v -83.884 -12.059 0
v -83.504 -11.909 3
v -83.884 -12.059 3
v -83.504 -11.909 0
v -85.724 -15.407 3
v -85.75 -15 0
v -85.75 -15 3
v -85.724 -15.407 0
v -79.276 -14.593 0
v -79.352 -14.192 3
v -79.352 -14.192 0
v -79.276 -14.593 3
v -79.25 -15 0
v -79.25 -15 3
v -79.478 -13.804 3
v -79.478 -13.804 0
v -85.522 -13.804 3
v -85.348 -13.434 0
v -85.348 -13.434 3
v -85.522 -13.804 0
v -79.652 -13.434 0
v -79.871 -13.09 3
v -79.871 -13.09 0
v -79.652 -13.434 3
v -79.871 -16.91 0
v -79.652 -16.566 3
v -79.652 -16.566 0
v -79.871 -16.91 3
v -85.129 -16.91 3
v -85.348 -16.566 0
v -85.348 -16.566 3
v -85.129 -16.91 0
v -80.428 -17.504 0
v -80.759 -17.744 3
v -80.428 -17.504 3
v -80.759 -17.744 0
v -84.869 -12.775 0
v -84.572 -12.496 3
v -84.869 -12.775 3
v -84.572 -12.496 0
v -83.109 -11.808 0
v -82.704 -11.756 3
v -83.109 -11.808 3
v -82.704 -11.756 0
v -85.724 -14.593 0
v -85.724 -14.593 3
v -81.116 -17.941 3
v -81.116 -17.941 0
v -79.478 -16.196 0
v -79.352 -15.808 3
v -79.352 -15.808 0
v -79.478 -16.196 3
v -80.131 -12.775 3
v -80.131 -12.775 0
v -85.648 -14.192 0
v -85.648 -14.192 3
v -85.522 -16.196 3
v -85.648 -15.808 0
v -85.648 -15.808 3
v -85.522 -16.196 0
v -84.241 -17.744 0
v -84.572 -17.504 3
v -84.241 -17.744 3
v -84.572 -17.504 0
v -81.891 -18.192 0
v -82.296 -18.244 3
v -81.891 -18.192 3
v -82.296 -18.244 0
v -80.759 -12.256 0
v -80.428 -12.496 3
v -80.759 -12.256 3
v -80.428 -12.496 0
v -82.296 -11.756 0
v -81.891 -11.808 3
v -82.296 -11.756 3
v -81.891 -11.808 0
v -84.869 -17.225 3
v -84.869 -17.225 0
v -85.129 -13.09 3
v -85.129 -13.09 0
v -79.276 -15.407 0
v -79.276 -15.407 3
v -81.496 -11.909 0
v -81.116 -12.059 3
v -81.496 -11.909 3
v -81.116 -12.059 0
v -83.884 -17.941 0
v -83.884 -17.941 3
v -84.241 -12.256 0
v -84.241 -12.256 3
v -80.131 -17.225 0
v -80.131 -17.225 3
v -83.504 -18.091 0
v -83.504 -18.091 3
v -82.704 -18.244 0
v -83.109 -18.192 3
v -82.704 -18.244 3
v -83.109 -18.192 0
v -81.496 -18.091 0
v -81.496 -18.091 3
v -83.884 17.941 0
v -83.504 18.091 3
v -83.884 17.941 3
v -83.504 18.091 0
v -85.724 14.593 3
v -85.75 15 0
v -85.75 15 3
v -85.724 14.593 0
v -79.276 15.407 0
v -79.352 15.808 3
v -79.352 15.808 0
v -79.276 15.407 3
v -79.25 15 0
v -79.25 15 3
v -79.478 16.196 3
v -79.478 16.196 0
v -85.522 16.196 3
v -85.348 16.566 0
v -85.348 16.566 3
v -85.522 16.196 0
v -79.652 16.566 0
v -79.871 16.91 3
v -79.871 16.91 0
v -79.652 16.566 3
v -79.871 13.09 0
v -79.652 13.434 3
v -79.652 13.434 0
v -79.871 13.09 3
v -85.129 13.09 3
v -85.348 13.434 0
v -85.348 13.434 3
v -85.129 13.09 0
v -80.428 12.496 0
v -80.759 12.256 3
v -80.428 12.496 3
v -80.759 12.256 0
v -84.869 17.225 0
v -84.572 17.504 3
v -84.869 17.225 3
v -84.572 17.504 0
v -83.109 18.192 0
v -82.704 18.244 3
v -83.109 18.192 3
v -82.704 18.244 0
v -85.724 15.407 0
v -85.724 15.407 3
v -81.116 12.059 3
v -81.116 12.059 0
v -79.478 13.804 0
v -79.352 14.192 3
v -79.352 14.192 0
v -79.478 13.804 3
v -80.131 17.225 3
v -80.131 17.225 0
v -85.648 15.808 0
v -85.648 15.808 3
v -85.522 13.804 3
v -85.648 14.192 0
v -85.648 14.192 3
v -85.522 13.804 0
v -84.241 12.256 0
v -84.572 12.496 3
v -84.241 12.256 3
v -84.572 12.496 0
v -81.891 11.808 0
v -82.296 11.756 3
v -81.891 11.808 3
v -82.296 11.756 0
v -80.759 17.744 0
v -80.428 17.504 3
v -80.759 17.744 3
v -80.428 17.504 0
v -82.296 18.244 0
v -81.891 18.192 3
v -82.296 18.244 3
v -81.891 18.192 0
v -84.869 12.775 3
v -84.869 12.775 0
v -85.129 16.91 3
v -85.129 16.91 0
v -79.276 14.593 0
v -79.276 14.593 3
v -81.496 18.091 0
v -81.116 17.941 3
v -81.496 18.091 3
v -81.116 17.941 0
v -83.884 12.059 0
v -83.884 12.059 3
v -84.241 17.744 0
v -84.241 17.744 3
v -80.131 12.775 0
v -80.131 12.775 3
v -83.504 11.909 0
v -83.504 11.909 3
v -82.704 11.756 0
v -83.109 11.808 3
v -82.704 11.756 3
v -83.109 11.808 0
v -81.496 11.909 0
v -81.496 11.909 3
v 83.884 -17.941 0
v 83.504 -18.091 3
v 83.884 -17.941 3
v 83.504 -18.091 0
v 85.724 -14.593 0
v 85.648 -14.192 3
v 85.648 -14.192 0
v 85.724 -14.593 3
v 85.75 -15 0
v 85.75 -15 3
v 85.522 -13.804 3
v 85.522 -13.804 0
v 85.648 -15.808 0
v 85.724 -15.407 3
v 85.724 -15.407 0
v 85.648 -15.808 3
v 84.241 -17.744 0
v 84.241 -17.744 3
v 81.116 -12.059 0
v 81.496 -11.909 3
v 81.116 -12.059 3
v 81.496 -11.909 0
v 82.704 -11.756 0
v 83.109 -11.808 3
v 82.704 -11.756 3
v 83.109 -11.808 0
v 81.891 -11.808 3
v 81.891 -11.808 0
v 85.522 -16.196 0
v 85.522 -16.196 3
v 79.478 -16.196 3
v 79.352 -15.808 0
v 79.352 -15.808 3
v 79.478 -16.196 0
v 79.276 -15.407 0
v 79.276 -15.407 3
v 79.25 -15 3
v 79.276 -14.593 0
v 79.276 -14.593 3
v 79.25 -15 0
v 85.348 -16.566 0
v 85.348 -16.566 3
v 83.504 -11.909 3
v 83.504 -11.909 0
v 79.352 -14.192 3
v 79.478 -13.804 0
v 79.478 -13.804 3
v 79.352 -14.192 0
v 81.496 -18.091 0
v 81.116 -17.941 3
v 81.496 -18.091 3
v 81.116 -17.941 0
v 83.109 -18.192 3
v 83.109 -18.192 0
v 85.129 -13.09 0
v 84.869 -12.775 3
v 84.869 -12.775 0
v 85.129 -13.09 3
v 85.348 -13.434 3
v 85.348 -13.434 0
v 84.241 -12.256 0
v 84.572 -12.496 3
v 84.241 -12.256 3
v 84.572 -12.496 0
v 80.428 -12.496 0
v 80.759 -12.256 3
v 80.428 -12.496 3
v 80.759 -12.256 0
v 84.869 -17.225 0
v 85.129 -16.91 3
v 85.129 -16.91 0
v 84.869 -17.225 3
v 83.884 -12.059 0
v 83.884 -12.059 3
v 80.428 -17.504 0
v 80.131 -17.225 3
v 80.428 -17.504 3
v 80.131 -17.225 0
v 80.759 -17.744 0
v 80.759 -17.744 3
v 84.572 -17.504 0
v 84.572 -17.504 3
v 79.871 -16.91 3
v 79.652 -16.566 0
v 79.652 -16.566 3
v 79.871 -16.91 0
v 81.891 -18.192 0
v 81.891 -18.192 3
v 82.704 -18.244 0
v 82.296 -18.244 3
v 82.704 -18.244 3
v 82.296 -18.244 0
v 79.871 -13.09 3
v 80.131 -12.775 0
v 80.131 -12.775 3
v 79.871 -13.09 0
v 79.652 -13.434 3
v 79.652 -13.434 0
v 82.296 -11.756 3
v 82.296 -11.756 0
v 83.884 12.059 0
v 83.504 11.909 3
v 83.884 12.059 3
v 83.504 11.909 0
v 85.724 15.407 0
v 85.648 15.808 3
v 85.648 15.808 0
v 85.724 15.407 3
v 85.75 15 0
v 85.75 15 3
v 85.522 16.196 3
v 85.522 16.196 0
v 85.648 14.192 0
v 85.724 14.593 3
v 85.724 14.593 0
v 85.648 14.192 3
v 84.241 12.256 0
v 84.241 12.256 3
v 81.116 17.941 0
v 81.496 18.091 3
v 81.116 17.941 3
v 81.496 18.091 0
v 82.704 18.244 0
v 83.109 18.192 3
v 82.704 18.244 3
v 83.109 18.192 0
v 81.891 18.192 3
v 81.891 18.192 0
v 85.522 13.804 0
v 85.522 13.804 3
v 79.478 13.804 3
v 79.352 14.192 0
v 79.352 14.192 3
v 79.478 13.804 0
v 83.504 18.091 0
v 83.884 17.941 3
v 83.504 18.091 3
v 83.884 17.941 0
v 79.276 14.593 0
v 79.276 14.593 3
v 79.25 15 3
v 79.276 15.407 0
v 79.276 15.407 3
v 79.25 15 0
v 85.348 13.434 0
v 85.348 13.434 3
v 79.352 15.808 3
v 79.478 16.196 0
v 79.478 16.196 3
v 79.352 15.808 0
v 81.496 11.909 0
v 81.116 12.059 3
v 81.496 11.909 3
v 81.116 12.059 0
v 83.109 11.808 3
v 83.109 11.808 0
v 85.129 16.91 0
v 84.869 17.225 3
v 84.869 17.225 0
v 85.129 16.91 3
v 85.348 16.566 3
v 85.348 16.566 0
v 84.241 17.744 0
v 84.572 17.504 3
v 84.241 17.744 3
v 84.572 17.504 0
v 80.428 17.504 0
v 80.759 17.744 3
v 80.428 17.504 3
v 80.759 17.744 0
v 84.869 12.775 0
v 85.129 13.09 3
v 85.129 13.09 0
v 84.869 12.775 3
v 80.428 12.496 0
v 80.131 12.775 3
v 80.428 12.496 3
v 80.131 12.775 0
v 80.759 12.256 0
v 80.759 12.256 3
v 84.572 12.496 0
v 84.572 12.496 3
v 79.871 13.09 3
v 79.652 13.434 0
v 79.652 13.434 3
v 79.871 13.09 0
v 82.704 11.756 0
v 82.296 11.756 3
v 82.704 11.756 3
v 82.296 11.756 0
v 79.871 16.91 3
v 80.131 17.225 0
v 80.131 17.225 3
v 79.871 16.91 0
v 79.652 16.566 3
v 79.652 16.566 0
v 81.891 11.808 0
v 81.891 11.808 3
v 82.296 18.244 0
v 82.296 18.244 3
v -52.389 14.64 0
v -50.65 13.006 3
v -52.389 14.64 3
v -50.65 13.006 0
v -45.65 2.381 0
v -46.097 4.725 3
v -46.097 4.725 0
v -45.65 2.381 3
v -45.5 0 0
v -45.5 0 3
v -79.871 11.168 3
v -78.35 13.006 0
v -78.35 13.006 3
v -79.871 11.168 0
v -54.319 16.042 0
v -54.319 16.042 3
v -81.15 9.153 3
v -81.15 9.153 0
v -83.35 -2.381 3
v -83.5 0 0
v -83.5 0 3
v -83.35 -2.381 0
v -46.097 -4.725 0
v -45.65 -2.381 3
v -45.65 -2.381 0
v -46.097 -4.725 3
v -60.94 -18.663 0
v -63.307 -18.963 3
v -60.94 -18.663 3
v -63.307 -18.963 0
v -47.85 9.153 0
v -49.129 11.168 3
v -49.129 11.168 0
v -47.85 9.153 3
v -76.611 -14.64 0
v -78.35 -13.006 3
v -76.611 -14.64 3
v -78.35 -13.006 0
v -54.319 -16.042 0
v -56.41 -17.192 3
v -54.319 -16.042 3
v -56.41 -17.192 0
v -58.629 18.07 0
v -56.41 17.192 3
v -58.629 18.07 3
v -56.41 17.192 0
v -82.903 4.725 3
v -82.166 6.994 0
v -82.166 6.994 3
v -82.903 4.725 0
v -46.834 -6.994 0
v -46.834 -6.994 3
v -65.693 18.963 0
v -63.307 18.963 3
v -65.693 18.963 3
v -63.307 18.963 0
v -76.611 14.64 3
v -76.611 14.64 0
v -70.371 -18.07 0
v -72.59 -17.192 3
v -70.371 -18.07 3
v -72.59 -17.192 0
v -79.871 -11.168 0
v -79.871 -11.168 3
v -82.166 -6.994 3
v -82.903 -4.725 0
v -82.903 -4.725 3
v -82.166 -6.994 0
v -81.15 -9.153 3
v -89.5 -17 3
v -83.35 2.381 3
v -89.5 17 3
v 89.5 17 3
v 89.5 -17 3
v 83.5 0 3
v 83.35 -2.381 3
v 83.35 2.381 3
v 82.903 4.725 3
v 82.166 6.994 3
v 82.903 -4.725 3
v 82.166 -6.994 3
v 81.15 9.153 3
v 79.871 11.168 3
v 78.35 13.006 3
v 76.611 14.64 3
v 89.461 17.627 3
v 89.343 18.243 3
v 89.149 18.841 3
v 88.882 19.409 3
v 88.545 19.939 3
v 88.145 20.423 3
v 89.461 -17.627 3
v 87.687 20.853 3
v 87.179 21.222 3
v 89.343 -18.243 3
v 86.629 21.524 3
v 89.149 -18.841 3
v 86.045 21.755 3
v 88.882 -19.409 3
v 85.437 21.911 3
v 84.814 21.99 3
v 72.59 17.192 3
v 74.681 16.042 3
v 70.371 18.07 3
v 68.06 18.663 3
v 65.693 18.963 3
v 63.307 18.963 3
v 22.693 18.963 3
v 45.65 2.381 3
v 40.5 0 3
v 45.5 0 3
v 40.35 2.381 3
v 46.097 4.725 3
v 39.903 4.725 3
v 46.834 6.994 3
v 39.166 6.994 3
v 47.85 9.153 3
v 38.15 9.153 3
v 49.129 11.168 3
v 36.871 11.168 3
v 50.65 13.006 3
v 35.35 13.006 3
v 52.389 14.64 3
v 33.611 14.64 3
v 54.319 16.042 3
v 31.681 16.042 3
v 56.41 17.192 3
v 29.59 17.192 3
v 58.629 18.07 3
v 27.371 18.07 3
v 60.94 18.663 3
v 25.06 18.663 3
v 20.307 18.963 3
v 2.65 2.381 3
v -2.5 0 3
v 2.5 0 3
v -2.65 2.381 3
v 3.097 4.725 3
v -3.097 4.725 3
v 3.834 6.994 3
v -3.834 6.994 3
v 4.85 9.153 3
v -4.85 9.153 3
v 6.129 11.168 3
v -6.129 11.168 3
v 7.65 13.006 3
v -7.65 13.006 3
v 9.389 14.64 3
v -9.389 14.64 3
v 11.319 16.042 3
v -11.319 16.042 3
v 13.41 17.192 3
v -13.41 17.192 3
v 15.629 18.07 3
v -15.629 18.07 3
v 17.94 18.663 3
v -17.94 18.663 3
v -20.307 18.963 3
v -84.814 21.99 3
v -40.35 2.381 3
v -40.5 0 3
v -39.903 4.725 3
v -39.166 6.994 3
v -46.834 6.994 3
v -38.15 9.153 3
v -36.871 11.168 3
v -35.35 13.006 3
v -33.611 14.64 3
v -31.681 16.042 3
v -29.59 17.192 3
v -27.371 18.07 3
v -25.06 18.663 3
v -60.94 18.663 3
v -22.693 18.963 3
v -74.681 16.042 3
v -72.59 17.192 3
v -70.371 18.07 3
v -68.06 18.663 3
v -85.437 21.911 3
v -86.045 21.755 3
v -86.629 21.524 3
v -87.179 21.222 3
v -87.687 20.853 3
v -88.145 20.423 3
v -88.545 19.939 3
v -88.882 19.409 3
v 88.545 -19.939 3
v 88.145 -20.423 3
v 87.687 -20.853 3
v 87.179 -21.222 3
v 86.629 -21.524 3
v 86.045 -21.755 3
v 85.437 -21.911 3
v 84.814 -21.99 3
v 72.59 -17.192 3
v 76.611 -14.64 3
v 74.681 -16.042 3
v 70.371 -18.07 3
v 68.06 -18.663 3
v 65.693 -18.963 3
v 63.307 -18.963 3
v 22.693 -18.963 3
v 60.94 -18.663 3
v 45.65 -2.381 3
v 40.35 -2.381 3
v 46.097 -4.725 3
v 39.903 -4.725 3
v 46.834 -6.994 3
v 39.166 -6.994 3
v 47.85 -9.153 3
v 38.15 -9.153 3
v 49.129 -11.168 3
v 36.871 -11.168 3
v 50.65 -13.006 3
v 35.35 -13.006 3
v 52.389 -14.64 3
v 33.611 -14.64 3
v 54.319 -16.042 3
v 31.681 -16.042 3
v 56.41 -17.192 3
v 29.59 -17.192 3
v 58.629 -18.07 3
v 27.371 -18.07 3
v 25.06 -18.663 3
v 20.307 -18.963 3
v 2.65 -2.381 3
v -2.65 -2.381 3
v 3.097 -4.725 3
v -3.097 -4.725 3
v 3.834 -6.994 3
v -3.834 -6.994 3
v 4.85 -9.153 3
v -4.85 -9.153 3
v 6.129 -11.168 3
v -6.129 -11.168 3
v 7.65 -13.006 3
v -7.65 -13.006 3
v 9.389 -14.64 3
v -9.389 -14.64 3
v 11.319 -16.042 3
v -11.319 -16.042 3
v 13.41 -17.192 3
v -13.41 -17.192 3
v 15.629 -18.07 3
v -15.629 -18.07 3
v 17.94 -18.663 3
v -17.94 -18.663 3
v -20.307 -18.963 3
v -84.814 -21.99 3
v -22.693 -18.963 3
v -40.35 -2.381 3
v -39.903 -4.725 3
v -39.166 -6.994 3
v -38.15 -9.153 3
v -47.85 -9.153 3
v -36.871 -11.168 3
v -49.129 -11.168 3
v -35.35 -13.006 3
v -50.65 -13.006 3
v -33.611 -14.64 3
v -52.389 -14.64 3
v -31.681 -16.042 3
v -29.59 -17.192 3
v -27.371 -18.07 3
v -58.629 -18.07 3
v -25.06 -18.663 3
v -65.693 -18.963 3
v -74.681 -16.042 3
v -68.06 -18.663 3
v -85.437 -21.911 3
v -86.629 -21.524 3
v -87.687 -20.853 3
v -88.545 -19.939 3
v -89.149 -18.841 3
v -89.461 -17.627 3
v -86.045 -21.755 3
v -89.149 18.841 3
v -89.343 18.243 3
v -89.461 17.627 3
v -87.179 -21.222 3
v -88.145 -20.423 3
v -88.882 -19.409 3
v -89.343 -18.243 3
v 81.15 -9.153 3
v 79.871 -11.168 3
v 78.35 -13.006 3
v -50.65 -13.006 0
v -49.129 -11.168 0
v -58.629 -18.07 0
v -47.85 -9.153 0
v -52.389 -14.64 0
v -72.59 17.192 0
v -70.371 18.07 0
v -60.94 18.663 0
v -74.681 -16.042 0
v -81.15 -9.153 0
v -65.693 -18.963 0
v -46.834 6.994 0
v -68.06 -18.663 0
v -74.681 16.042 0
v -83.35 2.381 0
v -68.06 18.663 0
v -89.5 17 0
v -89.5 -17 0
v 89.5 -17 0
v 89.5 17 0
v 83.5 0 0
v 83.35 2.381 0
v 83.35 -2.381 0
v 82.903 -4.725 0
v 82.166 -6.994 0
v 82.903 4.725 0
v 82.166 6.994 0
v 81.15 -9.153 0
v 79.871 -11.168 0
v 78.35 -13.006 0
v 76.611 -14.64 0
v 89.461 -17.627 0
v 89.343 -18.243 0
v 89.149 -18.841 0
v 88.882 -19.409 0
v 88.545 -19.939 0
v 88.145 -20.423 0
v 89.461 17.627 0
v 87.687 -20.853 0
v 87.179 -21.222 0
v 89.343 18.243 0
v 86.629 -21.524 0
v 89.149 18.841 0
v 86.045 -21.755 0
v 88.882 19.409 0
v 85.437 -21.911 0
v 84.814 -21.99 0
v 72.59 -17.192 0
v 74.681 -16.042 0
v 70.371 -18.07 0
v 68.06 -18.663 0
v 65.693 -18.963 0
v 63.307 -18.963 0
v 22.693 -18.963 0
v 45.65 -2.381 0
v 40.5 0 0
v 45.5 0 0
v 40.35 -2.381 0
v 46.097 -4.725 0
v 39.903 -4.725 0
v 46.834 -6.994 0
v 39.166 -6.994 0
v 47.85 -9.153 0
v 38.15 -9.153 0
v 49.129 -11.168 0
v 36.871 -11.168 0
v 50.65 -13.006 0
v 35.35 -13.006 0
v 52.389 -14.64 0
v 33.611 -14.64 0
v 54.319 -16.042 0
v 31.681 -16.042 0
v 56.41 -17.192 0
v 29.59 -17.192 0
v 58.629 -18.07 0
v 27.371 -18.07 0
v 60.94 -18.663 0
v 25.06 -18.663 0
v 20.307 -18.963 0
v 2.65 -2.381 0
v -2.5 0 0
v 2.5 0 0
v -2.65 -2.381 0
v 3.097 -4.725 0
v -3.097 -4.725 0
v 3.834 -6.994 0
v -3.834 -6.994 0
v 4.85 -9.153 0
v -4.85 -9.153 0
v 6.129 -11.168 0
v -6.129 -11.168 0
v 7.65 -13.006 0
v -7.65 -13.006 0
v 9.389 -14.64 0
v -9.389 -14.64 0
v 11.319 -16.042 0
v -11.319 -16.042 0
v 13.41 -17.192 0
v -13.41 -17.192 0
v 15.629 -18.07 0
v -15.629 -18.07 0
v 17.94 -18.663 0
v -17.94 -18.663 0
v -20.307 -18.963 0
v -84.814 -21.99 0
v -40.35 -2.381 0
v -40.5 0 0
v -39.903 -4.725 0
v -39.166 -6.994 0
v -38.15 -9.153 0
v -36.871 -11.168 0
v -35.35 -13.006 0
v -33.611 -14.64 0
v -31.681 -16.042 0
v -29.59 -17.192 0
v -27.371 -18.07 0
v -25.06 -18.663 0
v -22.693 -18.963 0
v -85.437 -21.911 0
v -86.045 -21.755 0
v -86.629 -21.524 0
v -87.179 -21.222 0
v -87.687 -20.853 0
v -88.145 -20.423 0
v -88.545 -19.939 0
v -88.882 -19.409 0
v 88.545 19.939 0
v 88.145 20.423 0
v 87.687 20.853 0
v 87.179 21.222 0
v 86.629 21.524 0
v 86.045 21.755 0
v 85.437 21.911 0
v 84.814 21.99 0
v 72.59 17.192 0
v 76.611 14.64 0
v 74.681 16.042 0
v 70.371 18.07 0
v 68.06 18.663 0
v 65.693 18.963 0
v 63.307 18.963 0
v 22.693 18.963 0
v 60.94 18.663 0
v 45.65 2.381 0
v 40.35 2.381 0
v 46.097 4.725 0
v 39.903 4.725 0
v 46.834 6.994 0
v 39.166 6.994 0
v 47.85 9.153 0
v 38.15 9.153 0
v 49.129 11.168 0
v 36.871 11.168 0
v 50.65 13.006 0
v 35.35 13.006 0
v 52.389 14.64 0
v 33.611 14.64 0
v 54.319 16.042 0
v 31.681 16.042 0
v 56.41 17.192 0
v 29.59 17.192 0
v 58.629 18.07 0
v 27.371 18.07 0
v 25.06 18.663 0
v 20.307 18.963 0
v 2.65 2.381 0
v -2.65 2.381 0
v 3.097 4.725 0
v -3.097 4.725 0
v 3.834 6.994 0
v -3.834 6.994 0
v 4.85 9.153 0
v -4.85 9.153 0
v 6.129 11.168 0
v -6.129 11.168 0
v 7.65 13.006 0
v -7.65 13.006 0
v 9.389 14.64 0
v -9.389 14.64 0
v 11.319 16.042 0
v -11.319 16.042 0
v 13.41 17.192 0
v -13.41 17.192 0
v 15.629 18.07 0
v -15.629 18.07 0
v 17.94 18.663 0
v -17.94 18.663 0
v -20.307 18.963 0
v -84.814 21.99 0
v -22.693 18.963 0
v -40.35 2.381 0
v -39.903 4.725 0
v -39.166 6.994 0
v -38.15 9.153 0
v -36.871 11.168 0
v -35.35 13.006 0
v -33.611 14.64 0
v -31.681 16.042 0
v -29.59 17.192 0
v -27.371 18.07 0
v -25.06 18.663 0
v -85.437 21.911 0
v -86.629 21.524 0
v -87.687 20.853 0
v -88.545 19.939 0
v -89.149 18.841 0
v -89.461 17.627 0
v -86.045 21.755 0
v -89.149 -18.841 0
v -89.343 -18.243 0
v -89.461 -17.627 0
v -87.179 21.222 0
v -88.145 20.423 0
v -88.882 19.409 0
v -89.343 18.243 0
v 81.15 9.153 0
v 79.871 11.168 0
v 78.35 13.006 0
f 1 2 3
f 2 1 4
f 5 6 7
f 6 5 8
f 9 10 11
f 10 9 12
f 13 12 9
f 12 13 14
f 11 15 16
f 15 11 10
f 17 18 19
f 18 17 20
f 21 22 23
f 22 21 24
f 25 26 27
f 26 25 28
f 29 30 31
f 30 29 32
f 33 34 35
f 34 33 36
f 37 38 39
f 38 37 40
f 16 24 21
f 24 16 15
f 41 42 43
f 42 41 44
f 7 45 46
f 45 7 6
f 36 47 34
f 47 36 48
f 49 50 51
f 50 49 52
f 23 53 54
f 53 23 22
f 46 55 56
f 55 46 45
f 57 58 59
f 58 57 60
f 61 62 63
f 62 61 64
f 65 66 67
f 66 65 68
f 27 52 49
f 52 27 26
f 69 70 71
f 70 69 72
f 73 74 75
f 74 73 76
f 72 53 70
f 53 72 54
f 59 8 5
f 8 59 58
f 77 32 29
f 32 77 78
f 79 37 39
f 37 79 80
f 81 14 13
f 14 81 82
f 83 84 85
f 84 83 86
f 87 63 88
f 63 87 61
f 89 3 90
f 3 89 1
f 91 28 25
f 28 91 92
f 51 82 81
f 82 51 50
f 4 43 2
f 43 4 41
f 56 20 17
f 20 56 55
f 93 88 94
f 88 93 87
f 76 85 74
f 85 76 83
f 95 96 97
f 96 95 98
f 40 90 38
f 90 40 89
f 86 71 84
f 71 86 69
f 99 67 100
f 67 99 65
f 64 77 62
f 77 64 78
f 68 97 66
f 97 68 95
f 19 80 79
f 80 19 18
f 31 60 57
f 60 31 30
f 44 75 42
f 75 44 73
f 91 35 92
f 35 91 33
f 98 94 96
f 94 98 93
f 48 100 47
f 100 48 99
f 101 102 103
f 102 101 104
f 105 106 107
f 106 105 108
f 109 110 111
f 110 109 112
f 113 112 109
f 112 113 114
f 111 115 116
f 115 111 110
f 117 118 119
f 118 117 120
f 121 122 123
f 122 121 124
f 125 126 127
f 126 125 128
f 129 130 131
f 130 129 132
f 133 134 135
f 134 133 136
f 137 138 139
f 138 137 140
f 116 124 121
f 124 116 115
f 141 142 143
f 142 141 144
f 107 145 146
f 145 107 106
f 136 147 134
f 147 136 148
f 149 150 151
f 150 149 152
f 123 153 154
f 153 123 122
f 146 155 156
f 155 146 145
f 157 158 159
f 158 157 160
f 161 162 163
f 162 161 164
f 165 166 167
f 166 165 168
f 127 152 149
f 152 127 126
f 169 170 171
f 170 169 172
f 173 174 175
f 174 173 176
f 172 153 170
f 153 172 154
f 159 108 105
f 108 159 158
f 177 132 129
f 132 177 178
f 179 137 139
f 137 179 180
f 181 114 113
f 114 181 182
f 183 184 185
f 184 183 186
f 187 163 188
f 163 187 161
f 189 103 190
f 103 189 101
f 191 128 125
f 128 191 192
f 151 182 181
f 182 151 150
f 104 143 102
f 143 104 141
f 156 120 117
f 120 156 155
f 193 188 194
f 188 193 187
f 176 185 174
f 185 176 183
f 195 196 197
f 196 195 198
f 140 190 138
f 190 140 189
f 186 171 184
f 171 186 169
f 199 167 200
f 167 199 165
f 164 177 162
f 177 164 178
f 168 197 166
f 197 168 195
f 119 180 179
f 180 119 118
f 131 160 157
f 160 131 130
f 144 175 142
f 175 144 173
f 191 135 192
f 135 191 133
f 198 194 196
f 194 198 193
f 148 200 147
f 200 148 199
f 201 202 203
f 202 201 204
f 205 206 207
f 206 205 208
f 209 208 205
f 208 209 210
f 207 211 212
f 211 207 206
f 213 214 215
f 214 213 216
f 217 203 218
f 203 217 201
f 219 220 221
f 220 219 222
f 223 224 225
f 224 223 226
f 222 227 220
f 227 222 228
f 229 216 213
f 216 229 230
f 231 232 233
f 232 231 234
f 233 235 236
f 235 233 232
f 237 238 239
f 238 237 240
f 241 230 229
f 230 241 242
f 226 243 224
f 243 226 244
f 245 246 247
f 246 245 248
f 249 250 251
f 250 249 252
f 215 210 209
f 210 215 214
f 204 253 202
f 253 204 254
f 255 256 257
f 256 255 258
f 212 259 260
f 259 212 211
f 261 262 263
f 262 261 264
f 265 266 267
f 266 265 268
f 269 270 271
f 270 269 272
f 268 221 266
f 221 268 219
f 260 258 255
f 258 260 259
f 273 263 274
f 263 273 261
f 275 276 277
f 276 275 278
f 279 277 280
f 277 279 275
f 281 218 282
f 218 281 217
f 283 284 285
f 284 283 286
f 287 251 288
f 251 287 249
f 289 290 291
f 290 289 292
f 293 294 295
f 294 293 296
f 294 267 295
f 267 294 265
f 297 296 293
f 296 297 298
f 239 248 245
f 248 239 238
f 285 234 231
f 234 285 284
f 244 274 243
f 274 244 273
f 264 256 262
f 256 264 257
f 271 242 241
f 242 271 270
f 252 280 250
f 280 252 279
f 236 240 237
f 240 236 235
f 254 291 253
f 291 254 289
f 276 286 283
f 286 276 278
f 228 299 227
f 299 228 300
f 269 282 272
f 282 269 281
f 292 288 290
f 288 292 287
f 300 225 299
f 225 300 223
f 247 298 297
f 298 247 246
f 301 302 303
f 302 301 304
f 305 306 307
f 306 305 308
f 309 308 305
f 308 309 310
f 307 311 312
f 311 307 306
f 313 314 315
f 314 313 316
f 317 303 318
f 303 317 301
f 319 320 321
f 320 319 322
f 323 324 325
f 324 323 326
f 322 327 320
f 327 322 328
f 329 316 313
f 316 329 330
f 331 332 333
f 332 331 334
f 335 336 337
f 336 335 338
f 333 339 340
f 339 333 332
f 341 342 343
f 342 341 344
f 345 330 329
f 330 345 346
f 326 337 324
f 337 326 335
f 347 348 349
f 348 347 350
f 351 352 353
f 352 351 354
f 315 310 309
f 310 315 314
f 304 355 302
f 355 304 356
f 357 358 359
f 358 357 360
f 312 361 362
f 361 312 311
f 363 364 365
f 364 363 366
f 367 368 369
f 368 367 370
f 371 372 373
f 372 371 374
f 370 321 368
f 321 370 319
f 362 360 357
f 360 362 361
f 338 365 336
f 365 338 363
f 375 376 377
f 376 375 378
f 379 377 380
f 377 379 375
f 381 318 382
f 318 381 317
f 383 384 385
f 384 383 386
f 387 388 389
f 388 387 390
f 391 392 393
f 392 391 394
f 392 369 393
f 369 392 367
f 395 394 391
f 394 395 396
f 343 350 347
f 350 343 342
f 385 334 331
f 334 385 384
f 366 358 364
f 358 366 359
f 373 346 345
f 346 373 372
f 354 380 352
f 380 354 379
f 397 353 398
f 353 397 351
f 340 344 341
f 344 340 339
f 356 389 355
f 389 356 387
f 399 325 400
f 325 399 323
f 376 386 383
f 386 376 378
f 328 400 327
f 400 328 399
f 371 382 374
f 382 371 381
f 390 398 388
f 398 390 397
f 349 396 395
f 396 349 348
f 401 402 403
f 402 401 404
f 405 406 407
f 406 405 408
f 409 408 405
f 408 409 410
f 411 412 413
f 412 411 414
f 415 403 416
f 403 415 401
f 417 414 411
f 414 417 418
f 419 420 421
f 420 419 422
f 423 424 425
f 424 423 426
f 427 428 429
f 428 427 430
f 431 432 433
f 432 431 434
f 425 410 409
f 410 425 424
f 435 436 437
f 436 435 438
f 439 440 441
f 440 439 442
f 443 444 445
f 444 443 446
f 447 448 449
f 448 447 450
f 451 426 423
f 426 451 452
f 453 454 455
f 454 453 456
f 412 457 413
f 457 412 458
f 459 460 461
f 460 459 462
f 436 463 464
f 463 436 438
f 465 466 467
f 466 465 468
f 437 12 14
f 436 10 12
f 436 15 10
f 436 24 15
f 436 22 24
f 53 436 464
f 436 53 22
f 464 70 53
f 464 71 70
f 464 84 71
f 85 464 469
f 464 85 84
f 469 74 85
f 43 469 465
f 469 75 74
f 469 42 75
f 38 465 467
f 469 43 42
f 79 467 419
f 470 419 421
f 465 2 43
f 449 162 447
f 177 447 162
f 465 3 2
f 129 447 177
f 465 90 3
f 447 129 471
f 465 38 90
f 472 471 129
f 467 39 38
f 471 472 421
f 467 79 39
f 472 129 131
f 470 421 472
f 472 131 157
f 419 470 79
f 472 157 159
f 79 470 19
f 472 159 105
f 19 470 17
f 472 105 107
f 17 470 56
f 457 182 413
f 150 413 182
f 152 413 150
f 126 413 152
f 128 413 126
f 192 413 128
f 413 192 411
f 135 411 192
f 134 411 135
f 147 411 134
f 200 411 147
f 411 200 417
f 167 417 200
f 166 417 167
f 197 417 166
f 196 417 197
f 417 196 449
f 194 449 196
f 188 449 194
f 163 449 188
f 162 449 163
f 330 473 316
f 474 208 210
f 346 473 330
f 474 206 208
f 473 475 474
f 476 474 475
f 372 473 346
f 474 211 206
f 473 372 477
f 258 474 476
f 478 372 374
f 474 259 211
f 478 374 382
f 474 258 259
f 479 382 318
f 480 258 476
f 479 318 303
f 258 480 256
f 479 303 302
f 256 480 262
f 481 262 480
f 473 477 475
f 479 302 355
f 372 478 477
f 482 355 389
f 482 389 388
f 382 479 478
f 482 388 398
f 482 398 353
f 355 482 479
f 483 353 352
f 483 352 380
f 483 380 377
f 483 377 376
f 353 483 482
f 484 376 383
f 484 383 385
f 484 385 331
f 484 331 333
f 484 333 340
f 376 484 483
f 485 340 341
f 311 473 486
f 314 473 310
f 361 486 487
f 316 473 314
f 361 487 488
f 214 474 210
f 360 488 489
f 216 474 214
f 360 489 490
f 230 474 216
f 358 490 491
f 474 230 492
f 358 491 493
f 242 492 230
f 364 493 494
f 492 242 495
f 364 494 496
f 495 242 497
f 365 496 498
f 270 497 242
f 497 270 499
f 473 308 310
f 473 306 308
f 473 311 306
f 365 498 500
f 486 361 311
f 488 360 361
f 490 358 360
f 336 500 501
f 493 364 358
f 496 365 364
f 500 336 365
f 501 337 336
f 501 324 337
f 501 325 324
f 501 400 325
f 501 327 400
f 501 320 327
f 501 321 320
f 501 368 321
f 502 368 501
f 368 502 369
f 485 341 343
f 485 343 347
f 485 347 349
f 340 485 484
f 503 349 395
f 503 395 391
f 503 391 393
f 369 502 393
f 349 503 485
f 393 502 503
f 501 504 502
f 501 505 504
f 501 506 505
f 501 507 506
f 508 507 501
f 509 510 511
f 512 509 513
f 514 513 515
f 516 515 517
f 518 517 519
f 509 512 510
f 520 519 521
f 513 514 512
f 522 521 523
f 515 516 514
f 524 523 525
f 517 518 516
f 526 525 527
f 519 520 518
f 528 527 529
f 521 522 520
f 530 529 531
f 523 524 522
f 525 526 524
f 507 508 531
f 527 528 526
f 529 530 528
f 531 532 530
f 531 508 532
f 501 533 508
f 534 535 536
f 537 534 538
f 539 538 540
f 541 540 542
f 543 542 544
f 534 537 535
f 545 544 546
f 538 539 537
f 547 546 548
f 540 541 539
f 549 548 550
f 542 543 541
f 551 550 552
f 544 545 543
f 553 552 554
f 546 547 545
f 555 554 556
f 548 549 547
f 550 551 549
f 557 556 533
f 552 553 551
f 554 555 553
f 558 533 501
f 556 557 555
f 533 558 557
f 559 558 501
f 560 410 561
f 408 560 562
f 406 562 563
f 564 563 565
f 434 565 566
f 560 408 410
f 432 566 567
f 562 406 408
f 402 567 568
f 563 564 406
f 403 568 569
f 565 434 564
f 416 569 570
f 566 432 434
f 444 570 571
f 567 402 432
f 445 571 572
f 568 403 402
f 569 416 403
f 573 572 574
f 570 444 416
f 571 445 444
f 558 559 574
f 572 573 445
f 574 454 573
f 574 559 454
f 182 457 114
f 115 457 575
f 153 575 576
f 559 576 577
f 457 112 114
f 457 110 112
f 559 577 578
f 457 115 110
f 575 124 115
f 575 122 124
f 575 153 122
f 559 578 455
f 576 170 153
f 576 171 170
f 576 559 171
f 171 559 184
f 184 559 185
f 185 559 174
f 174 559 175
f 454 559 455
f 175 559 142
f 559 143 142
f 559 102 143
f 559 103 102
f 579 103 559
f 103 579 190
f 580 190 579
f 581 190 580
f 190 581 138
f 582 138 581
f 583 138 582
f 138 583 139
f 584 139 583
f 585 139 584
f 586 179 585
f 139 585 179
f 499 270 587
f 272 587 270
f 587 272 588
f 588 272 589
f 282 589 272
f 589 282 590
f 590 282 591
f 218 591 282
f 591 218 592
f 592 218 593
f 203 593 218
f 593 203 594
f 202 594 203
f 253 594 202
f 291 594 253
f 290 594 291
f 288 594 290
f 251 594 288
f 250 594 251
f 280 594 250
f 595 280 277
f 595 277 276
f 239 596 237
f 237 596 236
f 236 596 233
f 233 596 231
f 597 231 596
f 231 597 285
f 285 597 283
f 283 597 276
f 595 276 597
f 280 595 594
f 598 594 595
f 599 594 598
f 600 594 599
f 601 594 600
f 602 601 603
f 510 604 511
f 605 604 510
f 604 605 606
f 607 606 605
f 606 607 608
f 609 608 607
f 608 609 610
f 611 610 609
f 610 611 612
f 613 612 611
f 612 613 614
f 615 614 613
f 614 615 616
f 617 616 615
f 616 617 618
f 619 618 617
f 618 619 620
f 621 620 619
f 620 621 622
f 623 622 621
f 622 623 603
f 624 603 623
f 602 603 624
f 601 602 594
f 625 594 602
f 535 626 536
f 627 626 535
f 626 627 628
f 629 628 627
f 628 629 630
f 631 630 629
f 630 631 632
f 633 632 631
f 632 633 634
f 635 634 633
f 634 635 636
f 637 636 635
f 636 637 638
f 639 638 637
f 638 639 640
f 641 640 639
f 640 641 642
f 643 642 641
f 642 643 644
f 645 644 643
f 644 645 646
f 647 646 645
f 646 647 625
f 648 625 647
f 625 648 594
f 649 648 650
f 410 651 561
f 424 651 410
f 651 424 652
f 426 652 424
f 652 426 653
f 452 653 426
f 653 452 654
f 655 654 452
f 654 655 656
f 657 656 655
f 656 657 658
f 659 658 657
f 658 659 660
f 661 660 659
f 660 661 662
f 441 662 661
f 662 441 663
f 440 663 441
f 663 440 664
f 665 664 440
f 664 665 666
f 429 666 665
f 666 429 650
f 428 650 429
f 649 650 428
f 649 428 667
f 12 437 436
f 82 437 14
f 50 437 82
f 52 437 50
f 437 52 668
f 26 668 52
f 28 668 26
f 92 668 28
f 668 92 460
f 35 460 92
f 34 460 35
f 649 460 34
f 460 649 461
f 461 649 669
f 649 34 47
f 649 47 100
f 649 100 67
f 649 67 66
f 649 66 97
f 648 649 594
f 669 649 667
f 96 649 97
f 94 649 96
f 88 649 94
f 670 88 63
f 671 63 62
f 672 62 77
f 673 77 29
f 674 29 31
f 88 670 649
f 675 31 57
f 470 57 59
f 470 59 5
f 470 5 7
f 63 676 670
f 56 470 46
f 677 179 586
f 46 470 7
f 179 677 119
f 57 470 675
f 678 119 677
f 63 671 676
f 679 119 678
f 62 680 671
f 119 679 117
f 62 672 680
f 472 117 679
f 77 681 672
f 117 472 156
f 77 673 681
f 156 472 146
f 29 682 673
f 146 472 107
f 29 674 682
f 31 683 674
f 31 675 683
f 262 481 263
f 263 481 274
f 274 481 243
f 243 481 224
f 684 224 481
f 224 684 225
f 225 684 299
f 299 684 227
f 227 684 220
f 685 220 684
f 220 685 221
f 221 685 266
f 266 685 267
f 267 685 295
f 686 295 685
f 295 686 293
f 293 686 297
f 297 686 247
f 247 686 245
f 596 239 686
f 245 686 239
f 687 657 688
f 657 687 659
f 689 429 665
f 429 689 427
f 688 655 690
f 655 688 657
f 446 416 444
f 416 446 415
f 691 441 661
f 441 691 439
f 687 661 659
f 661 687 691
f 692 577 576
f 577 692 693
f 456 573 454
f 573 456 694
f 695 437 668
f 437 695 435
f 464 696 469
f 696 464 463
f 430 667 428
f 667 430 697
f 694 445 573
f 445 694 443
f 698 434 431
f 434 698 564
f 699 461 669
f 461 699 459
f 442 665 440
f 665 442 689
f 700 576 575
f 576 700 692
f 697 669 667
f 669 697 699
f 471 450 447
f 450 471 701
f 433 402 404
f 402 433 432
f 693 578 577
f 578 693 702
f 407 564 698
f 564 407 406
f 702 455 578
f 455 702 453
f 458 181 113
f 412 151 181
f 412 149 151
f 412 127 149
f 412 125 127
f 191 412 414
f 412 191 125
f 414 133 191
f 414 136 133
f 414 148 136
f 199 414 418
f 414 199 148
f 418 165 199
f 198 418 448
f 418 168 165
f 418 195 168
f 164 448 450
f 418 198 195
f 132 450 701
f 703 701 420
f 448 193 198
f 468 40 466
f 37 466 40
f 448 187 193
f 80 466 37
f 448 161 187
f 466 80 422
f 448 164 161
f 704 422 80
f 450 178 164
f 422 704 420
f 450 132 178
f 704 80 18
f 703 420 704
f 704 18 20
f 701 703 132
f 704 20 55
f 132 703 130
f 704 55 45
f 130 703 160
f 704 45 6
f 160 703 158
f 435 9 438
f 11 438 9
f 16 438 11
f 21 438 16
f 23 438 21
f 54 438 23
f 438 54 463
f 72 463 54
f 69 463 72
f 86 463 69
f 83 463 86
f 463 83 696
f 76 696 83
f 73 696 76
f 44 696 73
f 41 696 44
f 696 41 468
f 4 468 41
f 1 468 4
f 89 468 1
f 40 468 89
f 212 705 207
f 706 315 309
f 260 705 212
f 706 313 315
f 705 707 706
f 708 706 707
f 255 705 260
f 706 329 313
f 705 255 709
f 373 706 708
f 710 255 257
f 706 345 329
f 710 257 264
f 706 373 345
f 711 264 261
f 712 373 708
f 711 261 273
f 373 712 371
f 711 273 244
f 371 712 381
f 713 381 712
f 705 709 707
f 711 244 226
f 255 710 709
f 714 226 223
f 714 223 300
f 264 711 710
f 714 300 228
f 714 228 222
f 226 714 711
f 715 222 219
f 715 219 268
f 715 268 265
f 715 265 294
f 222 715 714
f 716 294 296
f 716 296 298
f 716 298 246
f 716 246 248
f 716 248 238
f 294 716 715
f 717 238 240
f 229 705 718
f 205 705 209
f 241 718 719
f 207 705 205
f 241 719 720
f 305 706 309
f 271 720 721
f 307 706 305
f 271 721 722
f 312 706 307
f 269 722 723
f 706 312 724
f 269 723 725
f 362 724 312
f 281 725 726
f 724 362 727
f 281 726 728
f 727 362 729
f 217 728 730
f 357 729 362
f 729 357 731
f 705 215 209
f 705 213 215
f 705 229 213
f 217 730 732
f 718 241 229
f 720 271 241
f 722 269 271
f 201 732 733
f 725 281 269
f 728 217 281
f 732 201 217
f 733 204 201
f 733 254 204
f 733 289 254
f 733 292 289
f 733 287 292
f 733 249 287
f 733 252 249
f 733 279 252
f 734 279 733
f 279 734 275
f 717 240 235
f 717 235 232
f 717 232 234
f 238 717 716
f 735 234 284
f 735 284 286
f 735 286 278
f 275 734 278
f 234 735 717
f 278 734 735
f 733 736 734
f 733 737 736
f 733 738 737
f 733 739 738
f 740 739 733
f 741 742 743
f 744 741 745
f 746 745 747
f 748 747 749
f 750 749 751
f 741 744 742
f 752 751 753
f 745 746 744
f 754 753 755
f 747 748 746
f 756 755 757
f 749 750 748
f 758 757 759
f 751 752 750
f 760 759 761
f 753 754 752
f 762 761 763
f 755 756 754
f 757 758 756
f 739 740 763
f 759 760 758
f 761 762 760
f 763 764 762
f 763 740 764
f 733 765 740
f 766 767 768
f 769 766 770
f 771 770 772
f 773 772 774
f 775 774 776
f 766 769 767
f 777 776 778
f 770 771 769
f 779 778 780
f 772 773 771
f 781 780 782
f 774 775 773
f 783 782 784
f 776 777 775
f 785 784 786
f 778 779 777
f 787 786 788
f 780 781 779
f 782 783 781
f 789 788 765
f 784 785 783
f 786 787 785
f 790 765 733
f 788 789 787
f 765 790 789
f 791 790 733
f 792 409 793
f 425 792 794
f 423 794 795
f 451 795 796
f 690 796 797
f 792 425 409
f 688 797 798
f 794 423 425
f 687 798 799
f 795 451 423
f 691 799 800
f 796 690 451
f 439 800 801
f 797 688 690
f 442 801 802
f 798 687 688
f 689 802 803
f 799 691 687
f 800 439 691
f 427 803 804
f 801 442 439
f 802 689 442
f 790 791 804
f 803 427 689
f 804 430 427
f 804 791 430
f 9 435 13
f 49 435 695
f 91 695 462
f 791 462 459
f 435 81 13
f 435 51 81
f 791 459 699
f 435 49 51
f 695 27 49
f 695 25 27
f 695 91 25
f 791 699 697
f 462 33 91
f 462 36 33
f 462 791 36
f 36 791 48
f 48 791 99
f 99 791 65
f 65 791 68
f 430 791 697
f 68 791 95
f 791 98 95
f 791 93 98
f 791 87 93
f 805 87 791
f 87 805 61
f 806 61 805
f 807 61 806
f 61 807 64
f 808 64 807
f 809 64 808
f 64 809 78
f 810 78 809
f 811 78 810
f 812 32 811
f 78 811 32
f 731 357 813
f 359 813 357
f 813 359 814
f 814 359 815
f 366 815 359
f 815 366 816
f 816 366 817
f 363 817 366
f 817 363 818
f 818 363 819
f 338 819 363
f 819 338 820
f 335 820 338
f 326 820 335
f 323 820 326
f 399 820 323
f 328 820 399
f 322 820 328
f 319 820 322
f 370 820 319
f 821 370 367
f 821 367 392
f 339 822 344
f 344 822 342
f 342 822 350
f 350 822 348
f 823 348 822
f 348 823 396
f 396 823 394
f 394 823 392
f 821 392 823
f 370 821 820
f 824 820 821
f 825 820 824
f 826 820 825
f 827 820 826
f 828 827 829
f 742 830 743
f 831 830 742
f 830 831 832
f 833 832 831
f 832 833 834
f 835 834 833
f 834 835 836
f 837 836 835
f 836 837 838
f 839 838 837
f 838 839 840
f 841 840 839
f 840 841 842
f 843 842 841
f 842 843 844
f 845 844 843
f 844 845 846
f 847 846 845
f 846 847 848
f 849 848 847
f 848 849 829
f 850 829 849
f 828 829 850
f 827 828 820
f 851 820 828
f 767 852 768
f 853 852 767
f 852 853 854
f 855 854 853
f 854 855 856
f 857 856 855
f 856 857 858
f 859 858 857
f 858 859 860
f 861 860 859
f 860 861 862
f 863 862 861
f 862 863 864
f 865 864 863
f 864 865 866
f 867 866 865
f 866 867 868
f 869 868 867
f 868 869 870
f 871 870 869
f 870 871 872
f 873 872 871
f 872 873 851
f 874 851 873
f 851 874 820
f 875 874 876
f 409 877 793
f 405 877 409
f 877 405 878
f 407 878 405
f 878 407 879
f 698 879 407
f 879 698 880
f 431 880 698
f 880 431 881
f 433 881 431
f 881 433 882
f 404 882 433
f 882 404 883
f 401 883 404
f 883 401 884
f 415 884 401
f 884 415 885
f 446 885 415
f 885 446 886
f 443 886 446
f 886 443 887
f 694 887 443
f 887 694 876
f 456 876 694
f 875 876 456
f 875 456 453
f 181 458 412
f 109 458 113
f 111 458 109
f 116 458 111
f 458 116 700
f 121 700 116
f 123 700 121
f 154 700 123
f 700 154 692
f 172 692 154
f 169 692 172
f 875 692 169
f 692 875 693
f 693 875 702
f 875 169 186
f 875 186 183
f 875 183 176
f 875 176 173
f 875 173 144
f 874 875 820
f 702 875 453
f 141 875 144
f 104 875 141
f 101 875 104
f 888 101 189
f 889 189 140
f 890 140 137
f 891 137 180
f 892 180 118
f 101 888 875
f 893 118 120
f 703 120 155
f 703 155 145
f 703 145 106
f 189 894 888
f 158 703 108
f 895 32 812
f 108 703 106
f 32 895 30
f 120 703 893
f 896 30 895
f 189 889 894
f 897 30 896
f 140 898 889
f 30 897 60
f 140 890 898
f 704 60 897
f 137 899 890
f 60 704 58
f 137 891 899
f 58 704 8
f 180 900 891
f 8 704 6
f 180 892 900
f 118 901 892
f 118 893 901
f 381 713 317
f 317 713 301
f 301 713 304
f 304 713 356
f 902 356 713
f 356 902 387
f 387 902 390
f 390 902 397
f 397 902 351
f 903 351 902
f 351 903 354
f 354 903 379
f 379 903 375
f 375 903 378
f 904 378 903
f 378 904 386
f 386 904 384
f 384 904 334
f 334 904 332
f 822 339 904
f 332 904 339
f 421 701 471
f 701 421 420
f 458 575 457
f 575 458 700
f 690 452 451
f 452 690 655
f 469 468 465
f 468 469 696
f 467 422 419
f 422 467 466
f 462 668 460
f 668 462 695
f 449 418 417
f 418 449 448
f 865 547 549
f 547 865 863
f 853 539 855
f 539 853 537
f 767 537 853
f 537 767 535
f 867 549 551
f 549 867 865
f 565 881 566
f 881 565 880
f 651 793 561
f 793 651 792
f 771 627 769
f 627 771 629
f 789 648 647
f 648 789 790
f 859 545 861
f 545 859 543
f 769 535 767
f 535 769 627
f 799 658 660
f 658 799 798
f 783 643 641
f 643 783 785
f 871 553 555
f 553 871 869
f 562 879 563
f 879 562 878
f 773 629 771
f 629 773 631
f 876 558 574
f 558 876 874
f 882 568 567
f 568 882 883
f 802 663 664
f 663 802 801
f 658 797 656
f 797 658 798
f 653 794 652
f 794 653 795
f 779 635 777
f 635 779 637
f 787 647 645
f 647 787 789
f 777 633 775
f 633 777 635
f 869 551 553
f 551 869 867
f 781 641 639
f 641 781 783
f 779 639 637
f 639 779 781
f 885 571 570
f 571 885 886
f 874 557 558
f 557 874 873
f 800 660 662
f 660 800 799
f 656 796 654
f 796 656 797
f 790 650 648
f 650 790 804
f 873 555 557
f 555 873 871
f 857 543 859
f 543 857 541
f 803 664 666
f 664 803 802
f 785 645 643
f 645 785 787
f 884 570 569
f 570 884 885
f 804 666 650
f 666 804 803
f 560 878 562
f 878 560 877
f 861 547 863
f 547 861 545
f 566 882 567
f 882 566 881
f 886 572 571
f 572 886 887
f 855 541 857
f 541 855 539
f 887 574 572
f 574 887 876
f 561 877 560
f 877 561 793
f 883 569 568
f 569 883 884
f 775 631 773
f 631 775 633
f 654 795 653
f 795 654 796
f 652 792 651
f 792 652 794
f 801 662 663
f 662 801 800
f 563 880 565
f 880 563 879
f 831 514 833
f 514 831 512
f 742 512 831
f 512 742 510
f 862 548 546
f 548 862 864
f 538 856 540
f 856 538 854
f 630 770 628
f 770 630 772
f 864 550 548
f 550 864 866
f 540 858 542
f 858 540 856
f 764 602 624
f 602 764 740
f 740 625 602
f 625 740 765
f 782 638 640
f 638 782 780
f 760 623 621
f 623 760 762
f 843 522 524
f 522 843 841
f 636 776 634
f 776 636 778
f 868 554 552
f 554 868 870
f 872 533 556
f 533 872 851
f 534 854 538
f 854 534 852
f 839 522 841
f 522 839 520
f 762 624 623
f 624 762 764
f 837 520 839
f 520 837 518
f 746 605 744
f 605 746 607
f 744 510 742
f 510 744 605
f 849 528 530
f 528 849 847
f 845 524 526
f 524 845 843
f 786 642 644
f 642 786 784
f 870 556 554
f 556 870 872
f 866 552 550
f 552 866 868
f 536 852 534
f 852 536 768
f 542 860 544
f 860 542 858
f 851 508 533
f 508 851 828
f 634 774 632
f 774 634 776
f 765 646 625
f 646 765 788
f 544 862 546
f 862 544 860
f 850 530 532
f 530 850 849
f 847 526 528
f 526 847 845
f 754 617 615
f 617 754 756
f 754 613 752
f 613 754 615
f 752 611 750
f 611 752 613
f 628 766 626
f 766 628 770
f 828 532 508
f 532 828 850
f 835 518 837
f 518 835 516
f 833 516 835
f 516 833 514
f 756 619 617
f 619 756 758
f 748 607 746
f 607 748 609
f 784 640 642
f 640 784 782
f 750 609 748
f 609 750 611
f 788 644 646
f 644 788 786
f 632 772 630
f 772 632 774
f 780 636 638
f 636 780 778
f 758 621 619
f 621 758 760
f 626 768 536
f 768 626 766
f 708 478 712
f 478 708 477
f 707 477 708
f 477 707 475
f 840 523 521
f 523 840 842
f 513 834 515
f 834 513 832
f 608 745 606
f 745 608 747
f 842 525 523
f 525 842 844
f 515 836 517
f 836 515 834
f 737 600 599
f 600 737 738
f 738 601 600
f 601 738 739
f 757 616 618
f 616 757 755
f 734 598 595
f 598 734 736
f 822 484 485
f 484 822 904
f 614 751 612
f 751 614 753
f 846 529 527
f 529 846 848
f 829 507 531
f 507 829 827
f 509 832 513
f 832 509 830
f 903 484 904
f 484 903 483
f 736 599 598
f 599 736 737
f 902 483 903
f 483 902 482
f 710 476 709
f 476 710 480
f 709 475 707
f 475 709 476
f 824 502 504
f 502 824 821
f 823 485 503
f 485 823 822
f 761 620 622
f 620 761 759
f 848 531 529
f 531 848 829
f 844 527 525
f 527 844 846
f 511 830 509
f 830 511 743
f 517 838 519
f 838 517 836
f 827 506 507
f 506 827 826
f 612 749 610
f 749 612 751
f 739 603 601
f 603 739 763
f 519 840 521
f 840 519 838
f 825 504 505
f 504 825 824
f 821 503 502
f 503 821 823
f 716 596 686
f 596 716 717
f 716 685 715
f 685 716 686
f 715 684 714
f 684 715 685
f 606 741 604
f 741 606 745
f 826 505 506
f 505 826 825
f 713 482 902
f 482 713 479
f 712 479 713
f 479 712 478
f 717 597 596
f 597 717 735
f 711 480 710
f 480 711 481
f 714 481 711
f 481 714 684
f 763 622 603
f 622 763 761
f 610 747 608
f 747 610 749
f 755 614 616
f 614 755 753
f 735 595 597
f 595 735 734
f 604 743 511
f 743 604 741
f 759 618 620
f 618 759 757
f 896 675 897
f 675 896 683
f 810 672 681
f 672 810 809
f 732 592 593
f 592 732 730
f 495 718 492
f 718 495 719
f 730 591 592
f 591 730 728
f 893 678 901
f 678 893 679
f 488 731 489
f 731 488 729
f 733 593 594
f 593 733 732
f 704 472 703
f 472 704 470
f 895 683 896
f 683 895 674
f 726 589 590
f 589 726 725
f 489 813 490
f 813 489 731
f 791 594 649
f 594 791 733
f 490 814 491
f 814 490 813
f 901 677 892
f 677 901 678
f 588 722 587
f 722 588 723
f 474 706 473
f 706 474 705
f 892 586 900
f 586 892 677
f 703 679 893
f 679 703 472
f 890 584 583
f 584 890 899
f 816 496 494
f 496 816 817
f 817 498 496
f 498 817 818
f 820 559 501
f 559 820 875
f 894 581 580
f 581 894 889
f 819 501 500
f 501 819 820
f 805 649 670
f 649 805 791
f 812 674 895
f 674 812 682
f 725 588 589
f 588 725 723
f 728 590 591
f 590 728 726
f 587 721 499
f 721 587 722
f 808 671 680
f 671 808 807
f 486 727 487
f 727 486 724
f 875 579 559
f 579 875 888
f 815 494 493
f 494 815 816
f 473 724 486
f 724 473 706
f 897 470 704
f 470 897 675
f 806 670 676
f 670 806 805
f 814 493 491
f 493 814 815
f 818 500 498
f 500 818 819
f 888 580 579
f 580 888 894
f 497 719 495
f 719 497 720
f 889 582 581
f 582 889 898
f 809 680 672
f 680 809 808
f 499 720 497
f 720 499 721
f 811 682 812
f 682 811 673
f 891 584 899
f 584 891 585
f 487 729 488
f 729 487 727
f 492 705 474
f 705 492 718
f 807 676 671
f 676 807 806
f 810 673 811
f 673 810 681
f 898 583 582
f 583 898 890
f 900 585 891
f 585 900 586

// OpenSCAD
$fn = 50;

difference() {
	union() {
		hull() {
			translate(v = [-84.5, 17.0, 0]) {
				cylinder(h = 3, r = 5);
			}
			translate(v = [84.5, 17.0, 0]) {
				cylinder(h = 3, r = 5);
			}
			translate(v = [-84.5, -17.0, 0]) {
				cylinder(h = 3, r = 5);
			}
			translate(v = [84.5, -17.0, 0]) {
				cylinder(h = 3, r = 5);
			}
		}
	}
	union() {
		translate(v = [-82.5, -15.0, -100.0]) {
			cylinder(h = 200, r = 3.25);
		}
		translate(v = [-82.5, 15.0, -100.0]) {
			cylinder(h = 200, r = 3.25);
		}
		translate(v = [82.5, -15.0, -100.0]) {
			cylinder(h = 200, r = 3.25);
		}
		translate(v = [82.5, 15.0, -100.0]) {
			cylinder(h = 200, r = 3.25);
		}
		translate(v = [-82.5, -15.0, -100.0]) {
			cylinder(h = 200, r = 1.8);
		}
		translate(v = [-82.5, 15.0, -100.0]) {
			cylinder(h = 200, r = 1.8);
		}
		translate(v = [82.5, -15.0, -100.0]) {
			cylinder(h = 200, r = 1.8);
		}
		translate(v = [82.5, 15.0, -100.0]) {
			cylinder(h = 200, r = 1.8);
		}
		translate(v = [-64.5, 0, 0.0]) {
			cylinder(h = 3, r = 19.0);
		}
		translate(v = [-21.5, 0, 0.0]) {
			cylinder(h = 3, r = 19.0);
		}
		translate(v = [21.5, 0, 0.0]) {
			cylinder(h = 3, r = 19.0);
		}
		translate(v = [64.5, 0, 0.0]) {
			cylinder(h = 3, r = 19.0);
		}
	}
}
